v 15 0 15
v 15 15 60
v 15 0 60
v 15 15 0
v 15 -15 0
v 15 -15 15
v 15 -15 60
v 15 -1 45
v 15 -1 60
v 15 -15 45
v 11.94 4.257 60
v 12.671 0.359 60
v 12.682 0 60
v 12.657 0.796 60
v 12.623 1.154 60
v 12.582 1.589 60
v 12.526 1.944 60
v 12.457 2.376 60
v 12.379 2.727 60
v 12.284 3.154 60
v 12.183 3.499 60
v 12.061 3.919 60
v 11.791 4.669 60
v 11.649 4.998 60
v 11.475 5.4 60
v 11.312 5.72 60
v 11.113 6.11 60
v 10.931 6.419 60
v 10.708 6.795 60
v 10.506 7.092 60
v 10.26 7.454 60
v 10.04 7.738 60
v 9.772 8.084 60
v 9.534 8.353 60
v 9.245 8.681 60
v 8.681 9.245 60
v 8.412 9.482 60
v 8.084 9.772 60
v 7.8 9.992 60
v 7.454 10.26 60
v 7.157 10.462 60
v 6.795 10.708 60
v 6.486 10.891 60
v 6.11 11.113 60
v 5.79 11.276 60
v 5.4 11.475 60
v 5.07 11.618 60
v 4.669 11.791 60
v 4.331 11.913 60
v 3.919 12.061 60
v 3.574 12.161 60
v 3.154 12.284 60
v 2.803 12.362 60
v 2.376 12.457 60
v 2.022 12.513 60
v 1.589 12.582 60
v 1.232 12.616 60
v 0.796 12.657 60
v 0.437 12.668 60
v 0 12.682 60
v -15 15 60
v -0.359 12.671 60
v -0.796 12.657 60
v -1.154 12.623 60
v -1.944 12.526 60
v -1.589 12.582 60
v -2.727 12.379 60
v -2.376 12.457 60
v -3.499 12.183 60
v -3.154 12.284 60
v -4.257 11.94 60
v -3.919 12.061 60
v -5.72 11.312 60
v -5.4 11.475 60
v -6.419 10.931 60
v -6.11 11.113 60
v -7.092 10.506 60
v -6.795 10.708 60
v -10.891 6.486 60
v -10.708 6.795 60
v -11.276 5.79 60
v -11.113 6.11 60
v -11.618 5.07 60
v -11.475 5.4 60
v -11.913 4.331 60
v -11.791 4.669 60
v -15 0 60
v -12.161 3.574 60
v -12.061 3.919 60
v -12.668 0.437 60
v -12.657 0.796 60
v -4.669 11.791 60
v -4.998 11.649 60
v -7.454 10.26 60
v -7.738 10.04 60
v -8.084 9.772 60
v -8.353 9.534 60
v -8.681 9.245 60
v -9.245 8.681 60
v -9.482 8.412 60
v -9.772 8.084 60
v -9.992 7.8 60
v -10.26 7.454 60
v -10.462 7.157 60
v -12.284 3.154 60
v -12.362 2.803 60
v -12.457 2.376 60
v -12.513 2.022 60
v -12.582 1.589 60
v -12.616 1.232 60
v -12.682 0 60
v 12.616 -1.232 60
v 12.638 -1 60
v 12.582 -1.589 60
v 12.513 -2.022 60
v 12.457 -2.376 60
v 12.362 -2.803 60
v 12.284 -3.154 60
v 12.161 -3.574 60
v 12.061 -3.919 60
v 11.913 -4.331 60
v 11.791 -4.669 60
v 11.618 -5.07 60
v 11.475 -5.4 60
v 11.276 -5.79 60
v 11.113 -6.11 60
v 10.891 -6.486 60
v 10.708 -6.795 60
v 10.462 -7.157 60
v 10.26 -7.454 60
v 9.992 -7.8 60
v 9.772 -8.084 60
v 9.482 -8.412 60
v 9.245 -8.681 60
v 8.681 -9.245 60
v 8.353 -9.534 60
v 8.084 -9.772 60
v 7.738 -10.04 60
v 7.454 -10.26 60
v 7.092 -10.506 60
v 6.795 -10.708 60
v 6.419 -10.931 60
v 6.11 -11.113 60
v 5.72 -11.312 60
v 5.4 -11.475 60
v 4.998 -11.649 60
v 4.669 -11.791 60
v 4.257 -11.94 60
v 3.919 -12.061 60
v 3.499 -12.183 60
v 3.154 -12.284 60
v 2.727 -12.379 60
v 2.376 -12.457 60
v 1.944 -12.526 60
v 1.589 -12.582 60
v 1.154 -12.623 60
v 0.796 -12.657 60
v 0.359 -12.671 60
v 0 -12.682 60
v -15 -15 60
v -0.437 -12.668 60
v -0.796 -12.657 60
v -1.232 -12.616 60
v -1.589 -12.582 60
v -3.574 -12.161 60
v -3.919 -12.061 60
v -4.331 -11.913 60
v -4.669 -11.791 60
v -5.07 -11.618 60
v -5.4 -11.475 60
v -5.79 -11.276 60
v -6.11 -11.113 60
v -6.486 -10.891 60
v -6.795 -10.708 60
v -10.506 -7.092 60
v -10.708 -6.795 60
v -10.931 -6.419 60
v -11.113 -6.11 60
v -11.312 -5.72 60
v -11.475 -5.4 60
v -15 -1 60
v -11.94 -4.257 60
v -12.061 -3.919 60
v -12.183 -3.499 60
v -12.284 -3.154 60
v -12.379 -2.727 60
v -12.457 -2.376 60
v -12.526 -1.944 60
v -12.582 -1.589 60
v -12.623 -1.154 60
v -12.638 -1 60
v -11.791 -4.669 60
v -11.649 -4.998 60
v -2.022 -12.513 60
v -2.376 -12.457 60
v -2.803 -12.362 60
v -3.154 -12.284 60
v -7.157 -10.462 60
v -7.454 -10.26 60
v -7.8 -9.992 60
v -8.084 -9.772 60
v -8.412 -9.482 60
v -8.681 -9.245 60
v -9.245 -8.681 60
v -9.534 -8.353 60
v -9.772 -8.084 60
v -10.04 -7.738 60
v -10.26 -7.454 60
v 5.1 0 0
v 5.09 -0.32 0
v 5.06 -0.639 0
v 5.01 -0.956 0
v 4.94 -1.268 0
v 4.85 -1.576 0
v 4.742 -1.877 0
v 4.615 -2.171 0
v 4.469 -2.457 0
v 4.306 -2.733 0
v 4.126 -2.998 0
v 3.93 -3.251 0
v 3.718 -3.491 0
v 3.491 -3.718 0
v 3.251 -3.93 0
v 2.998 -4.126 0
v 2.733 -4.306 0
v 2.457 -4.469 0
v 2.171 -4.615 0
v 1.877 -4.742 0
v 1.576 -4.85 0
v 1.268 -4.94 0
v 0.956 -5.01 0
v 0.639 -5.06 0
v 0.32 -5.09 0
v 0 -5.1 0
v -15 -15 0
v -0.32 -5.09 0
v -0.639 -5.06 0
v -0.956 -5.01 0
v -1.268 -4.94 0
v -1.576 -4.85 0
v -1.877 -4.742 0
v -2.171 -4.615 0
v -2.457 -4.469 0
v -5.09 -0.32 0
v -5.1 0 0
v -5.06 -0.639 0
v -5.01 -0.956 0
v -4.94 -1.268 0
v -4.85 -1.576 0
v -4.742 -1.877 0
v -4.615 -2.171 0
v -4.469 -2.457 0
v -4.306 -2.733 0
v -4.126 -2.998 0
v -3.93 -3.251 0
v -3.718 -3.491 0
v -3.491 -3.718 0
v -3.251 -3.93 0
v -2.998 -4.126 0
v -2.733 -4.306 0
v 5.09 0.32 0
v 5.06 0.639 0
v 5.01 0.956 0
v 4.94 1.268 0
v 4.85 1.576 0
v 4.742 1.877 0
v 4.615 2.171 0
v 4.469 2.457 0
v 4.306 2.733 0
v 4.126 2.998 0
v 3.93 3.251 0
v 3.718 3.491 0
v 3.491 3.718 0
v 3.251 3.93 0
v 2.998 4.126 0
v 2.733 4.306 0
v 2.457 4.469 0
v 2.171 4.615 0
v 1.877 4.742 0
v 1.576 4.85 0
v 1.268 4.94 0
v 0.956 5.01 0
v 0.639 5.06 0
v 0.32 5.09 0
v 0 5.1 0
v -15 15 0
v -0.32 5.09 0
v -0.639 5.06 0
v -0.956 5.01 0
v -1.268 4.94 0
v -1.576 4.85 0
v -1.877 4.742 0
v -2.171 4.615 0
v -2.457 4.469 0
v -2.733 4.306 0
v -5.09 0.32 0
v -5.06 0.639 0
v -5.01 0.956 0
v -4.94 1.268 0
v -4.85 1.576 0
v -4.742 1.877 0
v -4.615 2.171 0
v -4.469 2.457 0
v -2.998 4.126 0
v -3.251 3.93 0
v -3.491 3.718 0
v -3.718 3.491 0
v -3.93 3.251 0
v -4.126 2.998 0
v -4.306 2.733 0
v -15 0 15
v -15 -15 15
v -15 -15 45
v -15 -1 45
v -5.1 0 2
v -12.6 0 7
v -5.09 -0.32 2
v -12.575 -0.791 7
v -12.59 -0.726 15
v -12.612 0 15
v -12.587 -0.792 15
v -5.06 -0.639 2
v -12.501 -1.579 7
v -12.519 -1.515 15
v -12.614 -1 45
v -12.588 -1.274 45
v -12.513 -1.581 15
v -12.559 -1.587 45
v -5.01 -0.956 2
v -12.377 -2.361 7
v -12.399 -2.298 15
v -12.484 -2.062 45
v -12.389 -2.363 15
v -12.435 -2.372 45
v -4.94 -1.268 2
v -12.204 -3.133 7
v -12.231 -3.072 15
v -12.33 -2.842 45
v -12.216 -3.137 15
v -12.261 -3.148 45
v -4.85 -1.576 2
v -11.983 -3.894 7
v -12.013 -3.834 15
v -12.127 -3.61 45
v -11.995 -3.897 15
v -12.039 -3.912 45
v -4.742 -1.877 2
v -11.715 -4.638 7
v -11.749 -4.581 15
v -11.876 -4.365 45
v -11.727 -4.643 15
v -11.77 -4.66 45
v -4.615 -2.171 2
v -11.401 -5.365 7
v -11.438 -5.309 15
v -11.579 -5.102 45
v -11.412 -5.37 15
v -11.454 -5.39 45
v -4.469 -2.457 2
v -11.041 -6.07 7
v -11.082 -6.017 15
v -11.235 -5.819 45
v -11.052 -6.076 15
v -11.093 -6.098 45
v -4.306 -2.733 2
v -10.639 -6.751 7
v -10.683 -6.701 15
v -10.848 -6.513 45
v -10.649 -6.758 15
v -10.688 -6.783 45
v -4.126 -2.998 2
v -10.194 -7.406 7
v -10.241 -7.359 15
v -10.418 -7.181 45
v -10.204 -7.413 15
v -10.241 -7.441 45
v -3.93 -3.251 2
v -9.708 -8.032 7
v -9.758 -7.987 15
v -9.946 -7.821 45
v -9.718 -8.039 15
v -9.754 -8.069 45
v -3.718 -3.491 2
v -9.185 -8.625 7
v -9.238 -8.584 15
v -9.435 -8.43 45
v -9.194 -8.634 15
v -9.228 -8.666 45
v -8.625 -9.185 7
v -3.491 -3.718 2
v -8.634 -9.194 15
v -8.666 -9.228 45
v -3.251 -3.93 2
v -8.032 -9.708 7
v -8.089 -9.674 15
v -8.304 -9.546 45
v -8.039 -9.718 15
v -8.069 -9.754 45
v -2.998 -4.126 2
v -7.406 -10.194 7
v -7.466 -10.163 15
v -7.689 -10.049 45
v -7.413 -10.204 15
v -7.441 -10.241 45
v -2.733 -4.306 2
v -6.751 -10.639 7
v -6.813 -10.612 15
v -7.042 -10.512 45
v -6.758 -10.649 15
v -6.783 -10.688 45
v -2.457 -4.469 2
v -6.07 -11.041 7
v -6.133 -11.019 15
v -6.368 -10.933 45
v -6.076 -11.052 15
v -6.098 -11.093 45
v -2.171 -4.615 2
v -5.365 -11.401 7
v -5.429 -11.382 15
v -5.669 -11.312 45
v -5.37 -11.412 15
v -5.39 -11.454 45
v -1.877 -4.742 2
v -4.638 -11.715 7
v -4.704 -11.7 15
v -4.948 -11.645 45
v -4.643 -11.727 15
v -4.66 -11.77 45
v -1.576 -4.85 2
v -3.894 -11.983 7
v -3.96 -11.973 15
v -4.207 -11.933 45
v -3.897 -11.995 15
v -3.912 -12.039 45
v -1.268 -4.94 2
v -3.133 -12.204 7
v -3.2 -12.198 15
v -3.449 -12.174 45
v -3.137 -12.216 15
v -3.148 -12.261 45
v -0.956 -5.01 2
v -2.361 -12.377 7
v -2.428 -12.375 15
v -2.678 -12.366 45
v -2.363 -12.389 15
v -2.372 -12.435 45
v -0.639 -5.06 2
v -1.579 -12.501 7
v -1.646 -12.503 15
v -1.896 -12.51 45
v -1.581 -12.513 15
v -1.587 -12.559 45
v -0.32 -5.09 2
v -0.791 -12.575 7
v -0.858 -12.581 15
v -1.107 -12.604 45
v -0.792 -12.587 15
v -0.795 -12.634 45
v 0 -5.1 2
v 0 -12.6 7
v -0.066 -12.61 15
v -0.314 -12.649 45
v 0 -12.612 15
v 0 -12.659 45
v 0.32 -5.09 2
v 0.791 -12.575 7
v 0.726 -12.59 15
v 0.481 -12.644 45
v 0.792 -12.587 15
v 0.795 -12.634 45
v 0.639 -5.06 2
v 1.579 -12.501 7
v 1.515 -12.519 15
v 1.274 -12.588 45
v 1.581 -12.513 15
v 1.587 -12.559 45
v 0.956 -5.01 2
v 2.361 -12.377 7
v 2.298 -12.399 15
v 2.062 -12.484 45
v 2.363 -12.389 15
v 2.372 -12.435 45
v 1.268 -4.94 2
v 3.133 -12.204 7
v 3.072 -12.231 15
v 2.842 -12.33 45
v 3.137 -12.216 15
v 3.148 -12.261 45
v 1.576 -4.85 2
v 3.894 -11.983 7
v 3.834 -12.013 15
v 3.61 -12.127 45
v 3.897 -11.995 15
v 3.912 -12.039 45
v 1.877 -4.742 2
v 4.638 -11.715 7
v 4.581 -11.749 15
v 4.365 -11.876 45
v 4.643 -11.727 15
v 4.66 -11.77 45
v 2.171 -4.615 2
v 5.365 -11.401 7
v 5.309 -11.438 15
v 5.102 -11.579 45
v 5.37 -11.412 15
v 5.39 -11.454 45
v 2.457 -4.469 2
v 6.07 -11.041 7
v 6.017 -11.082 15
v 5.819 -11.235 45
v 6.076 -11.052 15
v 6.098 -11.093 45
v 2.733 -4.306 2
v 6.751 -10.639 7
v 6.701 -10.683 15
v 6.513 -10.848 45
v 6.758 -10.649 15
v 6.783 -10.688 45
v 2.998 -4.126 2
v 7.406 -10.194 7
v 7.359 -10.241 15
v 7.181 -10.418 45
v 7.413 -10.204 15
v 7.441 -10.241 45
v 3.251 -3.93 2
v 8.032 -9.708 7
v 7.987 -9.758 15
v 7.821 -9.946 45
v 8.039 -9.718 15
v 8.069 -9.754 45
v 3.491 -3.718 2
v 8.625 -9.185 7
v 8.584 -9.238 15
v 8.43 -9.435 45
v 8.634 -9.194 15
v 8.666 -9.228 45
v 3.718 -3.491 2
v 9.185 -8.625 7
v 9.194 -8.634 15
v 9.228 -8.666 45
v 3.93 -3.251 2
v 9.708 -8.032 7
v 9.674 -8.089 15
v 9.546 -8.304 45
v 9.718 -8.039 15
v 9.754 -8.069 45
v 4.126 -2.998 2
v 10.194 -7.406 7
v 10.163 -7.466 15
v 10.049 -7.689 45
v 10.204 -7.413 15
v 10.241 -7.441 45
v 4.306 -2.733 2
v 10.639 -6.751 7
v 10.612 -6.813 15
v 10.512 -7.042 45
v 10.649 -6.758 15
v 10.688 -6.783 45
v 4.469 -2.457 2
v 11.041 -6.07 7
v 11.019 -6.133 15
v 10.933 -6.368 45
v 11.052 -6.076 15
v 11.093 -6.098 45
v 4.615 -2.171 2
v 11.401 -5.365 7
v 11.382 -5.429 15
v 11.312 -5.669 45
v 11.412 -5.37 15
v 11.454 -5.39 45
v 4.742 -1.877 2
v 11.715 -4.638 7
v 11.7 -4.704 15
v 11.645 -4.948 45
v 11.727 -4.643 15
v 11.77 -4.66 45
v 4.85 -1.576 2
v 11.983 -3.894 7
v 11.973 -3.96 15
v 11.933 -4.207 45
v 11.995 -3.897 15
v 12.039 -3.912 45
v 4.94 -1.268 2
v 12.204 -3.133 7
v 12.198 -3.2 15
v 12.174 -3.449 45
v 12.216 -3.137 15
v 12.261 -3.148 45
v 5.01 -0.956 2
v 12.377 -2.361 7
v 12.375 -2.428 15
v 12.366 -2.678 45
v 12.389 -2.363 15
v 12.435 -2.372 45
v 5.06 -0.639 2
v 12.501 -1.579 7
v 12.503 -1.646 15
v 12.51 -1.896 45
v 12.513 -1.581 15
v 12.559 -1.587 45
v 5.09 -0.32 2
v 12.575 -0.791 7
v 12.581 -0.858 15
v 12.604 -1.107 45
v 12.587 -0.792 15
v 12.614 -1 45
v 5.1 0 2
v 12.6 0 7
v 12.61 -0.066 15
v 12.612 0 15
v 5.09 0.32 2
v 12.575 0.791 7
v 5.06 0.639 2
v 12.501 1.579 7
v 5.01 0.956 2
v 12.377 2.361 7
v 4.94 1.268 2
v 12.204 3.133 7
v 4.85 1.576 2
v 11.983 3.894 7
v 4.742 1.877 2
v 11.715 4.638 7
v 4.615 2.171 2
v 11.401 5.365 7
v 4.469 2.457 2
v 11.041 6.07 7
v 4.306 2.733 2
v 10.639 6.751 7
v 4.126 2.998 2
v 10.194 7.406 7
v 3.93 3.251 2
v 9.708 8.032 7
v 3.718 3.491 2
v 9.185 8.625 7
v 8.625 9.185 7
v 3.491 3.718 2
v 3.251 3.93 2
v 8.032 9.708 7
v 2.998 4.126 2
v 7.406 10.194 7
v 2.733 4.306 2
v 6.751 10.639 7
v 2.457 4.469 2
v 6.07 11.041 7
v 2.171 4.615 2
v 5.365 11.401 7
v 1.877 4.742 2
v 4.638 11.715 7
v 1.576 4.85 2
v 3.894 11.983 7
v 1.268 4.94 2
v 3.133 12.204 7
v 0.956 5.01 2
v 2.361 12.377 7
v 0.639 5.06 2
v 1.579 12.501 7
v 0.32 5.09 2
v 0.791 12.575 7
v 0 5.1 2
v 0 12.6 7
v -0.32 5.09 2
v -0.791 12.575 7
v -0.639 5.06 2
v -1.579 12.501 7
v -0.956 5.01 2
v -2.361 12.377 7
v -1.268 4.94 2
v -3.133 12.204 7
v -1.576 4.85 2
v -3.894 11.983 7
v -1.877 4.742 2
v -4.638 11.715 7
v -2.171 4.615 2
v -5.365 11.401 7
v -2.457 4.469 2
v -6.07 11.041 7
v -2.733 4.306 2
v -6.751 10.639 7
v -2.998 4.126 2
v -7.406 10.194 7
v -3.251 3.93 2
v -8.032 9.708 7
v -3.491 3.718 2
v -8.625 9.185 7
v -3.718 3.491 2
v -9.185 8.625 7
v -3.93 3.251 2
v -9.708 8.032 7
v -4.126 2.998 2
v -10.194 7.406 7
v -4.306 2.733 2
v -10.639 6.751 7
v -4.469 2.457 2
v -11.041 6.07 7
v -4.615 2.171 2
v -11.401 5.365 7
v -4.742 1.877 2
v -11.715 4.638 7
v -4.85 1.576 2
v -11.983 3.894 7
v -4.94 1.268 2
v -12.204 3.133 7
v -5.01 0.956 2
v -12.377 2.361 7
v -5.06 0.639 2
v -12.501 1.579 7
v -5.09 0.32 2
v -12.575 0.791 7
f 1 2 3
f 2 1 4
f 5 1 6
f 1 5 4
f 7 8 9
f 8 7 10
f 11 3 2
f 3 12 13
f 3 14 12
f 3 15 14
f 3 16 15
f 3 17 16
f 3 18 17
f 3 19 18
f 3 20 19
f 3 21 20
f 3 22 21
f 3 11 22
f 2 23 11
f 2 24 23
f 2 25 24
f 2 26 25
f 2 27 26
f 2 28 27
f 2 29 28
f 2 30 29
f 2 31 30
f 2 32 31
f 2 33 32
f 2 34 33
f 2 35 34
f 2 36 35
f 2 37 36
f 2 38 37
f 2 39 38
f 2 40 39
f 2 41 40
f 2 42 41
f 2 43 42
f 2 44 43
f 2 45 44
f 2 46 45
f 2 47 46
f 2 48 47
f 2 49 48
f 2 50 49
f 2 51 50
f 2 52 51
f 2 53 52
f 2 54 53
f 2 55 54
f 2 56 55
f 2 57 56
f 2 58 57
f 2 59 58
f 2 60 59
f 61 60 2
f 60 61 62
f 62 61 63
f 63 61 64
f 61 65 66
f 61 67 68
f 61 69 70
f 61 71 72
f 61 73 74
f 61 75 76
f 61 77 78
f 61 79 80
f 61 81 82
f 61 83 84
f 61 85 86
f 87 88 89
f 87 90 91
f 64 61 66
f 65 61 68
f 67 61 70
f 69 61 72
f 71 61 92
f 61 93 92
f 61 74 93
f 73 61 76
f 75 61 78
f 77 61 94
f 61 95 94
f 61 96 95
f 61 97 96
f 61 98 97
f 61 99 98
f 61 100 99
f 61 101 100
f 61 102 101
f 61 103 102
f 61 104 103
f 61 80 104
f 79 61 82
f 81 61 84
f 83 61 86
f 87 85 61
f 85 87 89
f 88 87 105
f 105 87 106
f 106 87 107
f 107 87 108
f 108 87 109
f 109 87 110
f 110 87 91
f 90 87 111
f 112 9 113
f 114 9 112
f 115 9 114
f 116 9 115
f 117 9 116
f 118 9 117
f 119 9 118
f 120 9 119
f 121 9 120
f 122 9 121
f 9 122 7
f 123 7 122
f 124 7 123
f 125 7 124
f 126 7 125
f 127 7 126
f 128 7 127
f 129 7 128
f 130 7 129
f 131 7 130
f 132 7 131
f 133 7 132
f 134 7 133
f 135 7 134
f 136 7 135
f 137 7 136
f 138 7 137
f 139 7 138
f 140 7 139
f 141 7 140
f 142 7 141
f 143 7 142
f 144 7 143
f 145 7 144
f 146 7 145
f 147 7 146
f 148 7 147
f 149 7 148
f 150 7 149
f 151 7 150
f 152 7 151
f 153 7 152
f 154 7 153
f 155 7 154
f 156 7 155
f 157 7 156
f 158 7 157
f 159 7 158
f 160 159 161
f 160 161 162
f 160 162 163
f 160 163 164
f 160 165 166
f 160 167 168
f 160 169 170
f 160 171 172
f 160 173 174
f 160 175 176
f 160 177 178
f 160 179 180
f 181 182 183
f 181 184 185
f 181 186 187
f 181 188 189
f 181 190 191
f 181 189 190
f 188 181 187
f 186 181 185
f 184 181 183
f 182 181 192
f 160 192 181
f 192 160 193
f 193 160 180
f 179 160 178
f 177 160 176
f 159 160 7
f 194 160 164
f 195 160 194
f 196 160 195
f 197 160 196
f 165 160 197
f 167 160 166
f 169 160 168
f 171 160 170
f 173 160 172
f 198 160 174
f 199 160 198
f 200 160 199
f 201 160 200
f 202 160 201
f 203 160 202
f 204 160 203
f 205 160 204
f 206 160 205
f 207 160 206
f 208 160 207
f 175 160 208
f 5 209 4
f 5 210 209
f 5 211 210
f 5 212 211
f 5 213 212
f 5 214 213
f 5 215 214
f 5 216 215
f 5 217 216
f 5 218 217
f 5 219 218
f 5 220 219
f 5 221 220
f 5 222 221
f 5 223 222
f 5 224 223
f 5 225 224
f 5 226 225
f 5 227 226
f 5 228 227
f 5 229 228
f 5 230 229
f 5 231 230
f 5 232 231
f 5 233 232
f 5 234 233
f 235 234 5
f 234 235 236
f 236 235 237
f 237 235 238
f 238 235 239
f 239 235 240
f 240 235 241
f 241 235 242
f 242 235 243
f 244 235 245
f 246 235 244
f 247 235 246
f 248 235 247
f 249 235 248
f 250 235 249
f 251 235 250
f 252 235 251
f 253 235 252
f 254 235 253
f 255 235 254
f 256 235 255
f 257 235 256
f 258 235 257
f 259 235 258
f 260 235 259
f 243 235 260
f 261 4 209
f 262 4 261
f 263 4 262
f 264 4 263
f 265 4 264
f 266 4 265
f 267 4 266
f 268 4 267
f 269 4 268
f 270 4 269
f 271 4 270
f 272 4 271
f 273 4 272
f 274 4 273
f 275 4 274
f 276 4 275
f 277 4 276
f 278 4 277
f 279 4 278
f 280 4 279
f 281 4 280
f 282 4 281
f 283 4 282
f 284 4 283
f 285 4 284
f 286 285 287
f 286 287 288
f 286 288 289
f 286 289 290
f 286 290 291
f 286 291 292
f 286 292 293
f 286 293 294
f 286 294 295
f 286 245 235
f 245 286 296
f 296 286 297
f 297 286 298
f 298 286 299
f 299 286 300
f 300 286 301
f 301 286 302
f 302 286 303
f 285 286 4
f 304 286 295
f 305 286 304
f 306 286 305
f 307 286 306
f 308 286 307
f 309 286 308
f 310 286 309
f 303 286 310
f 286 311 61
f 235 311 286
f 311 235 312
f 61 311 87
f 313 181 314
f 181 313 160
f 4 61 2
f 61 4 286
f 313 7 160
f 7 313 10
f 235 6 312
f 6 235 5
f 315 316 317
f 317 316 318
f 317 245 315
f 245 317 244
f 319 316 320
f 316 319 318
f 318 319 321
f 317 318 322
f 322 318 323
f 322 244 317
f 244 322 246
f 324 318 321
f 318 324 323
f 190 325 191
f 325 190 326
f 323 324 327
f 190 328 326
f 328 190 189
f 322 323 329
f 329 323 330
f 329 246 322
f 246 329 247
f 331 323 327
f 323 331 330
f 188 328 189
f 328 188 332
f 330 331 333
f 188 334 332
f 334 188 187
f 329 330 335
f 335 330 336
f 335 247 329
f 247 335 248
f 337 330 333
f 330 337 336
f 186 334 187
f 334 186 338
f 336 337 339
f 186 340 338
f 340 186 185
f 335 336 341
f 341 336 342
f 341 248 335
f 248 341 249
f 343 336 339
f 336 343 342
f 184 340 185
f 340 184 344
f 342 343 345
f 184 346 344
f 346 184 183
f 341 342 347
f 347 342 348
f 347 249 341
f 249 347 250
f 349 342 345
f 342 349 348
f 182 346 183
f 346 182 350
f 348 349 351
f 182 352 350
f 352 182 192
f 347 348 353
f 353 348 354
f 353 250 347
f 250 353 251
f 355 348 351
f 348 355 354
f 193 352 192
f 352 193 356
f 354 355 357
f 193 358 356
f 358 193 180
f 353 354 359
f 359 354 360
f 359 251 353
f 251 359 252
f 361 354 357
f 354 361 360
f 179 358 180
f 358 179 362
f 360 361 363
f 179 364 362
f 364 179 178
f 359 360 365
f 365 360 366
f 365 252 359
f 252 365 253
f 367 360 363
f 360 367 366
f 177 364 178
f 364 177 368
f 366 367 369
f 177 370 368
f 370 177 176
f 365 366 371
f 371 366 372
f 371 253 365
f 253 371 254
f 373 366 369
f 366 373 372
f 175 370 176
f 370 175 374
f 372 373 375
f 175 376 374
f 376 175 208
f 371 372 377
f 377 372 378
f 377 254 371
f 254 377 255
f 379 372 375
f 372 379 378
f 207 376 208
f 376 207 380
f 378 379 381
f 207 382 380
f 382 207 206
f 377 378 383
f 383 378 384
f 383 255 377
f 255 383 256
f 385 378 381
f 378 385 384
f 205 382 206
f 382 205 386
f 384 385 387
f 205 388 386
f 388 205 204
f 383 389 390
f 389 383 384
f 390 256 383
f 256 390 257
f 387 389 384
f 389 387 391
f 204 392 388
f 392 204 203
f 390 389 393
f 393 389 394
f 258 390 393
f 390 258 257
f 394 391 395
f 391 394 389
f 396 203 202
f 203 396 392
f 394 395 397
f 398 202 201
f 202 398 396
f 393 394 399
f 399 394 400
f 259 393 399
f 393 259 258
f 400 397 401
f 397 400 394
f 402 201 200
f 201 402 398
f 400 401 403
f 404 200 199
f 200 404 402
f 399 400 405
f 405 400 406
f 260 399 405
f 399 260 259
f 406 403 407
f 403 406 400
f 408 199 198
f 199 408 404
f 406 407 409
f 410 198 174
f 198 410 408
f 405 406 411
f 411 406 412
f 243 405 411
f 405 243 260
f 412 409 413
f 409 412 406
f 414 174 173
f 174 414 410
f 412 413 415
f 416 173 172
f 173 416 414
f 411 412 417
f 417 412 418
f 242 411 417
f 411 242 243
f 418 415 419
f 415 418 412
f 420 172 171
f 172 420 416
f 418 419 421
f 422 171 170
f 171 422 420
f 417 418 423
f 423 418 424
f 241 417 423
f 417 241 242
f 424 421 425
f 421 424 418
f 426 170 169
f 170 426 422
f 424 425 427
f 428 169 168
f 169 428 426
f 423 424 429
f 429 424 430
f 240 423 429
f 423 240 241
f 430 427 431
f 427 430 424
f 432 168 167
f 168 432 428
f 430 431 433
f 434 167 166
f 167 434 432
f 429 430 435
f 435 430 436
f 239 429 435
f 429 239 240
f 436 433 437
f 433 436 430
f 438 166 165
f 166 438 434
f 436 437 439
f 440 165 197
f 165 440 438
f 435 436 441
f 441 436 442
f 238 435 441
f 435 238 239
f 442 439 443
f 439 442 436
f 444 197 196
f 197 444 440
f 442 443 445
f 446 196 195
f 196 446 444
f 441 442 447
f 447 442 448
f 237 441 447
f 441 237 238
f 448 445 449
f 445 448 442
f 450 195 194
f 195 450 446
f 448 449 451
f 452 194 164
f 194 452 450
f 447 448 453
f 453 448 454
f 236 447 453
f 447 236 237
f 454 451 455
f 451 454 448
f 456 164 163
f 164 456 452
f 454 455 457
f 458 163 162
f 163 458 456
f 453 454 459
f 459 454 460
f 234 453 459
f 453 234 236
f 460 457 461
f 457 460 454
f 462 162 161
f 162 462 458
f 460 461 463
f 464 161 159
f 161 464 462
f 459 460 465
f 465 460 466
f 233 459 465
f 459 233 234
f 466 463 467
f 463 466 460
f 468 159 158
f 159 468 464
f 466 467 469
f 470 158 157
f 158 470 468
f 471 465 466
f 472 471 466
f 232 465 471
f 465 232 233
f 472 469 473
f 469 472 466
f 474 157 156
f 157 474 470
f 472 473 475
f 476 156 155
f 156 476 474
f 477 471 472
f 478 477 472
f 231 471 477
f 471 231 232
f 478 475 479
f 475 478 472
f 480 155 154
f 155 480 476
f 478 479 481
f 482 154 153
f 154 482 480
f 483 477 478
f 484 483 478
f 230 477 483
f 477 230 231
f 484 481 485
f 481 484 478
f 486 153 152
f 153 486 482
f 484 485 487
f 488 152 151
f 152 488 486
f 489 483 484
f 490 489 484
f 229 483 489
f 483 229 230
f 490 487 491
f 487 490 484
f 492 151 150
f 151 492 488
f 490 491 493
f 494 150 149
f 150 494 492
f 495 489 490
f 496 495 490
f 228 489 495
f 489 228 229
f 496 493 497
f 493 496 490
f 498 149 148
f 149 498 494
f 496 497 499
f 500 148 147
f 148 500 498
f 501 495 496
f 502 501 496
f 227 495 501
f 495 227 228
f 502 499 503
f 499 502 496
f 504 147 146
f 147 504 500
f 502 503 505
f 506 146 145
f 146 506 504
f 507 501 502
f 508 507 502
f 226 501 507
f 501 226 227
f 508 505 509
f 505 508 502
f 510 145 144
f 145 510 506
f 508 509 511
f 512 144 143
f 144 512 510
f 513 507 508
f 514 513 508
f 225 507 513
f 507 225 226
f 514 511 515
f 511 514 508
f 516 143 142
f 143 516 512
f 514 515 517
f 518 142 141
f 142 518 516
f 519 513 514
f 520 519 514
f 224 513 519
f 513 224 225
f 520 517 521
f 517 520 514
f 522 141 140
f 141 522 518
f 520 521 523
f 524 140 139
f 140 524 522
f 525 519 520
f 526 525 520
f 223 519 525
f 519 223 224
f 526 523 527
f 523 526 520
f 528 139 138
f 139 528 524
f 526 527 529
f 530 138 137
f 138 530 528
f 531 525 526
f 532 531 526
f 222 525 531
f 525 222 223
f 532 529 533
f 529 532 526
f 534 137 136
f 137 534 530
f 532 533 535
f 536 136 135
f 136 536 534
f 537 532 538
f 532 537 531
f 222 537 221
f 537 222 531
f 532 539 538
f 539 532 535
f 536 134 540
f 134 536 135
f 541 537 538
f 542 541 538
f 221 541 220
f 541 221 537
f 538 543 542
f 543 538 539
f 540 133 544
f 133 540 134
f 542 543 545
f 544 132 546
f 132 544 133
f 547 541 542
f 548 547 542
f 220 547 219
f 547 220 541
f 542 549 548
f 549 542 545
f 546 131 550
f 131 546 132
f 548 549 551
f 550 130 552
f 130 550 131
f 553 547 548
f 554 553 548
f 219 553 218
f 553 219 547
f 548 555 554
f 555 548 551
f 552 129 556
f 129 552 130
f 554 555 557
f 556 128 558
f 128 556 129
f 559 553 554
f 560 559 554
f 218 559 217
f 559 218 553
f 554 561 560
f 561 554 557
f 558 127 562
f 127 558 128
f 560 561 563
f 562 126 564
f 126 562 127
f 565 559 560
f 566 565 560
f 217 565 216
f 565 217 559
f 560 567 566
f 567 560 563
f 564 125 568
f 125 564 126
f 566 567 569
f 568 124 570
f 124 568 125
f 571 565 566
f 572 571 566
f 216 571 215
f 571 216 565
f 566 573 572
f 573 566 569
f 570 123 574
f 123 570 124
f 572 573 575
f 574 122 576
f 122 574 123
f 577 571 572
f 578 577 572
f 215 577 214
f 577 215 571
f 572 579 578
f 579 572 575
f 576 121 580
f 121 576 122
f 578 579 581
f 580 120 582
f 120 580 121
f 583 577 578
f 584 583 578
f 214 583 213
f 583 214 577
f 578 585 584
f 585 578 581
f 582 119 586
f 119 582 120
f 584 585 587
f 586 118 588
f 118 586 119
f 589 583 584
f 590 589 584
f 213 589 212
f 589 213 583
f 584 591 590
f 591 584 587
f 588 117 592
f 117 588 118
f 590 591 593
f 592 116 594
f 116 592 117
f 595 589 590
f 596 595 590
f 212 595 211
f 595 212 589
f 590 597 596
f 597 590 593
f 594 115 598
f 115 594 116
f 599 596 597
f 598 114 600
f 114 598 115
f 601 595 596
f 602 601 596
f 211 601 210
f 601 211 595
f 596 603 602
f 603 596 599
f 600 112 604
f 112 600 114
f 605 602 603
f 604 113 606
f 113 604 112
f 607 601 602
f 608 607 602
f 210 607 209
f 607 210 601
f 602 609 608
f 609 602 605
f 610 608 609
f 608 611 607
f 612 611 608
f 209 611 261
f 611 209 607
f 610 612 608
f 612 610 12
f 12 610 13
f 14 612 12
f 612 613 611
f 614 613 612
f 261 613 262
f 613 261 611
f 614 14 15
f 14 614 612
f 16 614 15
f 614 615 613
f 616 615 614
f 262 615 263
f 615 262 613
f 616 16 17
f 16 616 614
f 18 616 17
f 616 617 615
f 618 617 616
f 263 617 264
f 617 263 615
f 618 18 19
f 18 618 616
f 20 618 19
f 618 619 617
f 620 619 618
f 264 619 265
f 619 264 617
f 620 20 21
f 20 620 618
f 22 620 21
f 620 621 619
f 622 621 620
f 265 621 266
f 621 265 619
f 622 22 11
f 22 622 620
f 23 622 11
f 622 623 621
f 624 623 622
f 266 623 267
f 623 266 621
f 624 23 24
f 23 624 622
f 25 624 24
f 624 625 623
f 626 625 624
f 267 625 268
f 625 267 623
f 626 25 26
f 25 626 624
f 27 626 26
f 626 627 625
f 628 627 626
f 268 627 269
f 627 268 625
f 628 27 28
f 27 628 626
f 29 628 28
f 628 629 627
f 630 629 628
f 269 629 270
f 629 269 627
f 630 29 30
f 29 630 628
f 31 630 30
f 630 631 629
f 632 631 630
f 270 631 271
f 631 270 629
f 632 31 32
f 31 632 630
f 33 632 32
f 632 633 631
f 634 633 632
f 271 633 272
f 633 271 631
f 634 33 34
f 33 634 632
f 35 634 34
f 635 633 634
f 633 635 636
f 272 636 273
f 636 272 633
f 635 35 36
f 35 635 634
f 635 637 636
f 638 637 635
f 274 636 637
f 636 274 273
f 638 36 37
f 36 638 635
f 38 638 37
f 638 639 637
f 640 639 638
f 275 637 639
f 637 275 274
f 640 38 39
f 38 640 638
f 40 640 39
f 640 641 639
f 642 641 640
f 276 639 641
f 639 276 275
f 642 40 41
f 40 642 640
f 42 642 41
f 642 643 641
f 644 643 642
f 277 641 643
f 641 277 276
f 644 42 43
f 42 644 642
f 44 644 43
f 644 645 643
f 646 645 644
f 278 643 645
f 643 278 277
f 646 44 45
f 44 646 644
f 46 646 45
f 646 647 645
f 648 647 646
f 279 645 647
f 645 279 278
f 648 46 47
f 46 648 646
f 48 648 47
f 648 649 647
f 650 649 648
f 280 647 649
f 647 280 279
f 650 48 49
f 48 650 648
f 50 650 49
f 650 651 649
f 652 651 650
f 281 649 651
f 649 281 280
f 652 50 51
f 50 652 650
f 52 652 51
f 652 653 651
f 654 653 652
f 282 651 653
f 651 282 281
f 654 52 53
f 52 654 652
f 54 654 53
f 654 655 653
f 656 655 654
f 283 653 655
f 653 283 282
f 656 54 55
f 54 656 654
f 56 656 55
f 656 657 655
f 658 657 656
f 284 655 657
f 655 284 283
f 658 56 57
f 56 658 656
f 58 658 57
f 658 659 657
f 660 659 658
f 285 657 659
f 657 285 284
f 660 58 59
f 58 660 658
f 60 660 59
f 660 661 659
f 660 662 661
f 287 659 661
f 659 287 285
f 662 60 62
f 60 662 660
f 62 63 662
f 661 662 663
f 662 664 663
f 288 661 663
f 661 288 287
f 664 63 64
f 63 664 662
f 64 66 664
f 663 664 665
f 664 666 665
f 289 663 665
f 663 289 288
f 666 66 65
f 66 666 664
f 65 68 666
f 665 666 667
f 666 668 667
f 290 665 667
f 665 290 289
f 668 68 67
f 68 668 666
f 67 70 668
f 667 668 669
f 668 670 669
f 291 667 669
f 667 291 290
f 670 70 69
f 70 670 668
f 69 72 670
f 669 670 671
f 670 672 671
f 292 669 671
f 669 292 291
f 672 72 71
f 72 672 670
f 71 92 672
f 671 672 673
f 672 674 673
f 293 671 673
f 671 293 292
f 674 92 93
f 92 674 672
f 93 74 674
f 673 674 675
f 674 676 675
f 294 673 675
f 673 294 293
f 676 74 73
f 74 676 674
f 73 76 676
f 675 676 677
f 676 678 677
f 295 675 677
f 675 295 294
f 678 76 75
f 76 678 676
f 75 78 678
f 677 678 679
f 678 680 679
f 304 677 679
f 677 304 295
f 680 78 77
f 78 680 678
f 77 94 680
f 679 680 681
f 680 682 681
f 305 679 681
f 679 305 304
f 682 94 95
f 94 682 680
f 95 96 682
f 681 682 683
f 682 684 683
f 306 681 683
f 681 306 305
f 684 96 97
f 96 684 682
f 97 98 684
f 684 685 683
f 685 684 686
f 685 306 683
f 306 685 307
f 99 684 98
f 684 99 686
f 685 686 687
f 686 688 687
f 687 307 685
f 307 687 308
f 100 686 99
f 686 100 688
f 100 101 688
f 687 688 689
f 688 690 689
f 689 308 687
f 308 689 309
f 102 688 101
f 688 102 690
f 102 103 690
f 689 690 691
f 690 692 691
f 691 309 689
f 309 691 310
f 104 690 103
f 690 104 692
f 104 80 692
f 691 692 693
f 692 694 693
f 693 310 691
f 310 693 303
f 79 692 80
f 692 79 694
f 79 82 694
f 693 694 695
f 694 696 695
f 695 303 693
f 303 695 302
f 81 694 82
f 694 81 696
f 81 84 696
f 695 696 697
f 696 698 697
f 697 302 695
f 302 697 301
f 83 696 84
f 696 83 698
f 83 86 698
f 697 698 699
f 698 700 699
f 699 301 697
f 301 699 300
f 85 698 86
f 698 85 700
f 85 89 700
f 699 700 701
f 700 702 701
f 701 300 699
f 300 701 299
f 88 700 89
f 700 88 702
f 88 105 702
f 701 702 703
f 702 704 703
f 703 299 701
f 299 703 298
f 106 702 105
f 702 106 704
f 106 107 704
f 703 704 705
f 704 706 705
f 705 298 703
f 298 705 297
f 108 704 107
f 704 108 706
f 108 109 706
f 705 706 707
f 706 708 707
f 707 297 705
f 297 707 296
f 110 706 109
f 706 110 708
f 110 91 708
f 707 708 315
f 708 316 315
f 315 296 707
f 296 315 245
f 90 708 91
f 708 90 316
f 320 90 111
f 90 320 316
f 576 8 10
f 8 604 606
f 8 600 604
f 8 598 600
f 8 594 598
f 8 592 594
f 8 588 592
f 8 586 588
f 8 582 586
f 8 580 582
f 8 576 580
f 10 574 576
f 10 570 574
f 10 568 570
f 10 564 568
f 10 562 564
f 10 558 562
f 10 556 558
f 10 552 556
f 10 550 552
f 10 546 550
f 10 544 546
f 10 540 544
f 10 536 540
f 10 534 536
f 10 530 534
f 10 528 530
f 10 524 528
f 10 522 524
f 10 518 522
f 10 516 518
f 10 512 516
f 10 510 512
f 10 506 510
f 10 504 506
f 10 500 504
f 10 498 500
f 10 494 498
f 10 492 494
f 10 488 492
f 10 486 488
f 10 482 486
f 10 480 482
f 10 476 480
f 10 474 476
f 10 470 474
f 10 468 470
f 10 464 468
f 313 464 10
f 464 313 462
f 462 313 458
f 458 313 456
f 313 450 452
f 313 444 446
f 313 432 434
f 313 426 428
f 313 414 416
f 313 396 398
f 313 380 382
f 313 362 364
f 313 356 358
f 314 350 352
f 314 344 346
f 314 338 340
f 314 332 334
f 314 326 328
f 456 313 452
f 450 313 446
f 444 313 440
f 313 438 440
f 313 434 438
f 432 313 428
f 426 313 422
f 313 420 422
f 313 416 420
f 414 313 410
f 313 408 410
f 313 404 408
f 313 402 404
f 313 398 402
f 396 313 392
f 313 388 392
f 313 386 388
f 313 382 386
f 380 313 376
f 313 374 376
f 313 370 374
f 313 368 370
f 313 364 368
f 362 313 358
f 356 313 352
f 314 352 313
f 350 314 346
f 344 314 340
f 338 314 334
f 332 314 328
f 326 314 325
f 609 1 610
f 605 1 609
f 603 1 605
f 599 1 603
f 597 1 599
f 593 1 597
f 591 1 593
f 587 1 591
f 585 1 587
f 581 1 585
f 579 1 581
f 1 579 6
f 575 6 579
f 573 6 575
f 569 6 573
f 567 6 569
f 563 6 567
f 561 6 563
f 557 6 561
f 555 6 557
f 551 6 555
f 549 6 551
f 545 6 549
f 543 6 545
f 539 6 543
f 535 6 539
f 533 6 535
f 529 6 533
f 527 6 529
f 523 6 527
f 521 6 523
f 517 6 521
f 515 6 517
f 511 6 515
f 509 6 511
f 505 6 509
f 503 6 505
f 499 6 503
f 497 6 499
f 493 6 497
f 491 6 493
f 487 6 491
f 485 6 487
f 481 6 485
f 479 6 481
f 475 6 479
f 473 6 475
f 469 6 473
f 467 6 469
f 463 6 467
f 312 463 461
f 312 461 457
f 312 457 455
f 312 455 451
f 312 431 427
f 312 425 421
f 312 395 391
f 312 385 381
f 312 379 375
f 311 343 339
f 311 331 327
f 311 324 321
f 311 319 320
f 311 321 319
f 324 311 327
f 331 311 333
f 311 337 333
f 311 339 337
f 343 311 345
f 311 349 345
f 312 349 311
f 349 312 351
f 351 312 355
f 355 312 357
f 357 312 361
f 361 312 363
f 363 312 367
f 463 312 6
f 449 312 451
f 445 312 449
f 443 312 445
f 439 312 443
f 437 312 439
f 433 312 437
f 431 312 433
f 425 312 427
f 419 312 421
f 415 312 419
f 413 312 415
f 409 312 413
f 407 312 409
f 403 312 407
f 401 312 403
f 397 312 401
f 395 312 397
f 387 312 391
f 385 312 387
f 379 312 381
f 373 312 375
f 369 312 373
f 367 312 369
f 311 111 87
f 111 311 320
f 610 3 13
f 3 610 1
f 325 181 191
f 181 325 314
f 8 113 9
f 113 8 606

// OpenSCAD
// file: roundedcube.scad
// Higher definition curves
$fs = 0.01;

module roundedcube(size = [1, 1, 1], center = false, radius = 0.5, apply_to = "all") {
	// If single value, convert to [x, y, z] vector
	size = (size[0] == undef) ? [size, size, size] : size;

	translate_min = radius;
	translate_xmax = size[0] - radius;
	translate_ymax = size[1] - radius;
	translate_zmax = size[2] - radius;

	diameter = radius * 2;

	module build_point(type = "sphere", rotate = [0, 0, 0]) {
		if (type == "sphere") {
			sphere(r = radius);
		} else if (type == "cylinder") {
			rotate(a = rotate)
			cylinder(h = diameter, r = radius, center = true);
		}
	}

	obj_translate = (center == false) ?
		[0, 0, 0] : [
			-(size[0] / 2),
			-(size[1] / 2),
			-(size[2] / 2)
		];

	translate(v = obj_translate) {
		hull() {
			for (translate_x = [translate_min, translate_xmax]) {
				x_at = (translate_x == translate_min) ? "min" : "max";
				for (translate_y = [translate_min, translate_ymax]) {
					y_at = (translate_y == translate_min) ? "min" : "max";
					for (translate_z = [translate_min, translate_zmax]) {
						z_at = (translate_z == translate_min) ? "min" : "max";

						translate(v = [translate_x, translate_y, translate_z])
						if (
							(apply_to == "all") ||
							(apply_to == "xmin" && x_at == "min") || (apply_to == "xmax" && x_at == "max") ||
							(apply_to == "ymin" && y_at == "min") || (apply_to == "ymax" && y_at == "max") ||
							(apply_to == "zmin" && z_at == "min") || (apply_to == "zmax" && z_at == "max")
						) {
							build_point("sphere");
						} else {
							rotate =
								(apply_to == "xmin" || apply_to == "xmax" || apply_to == "x") ? [0, 90, 0] : (
								(apply_to == "ymin" || apply_to == "ymax" || apply_to == "y") ? [90, 90, 0] :
								[0, 0, 0]
							);
							build_point("cylinder", rotate);
						}
					}
				}
			}
		}
	}
}

module roundedcubez(size = [1, 1, 1], center = false, radius = 0.5, apply_to = "all") {
	intersection() {
		roundedcube(size, center, radius, apply_to="z");
		scale([1.0, 1.0, 1.1])
			cube(size, center);
	}
}

// The good stuff!!!!  Forget about the whack stuff above.
// centered on XY only
module cube_(size=[1, 1, 1])
	translate([-size[0] / 2, -size[1] / 2, 0])
		cube(size);

// centered on XY only
module roundedcubez_(size = [1, 1, 1], radius = 0.5) {
	linear_extrude(height=size[2]) {
		square([size[0] - 2 * radius, size[1]], center=true);
		square([size[0], size[1] - 2 * radius], center=true);
		for (i=[-1, 1])
			for (j=[-1, 1])
				translate([i * (size[0] / 2 - radius), j * (size[1] / 2 - radius), 0])
					circle(r = radius);
	}
}
// main file
$fn = $preview ? 30 : 100;

include <roundedcube.scad>


// Fits on our big creality 3D printer head
module mounting_plate() {
	holes = [[0, 0], [-14, 0], [1, 25], [1 - 44, 25]];
	spacer_height = 3.5;

	difference() {
		union() {
			translate([-52, -7, 0.1])
				roundedcubez([60, 40, 4], radius=10);
			// spacers
			for (p = holes)
				translate([p[0], p[1], -spacer_height])
					cylinder(h=spacer_height, d=13, center=false);
		}

		// Trough holes
		for (p = holes)
			translate([p[0], p[1], 0])
				cylinder(h=20, d=spacer_height, center=true);

		// Holes for metal standoffs
		for (p = [holes[0], holes[1]]) {
			translate([p[0], p[1], -spacer_height - 0.01])
				cylinder(h=5, d=5.5, center=false);

		// Clearance stuff
		translate([-27.5, -5, -2.5])
			rotate([0, 0, 20])
				cube(size=[20, 20, 5], center=true);
		translate([-60 - 18, -17 + 5, -10])
			cube(size=[60, 10, 20]);
		}
	}
}

module syringe() {
	translate([0, 0, 97 + 5 + 2])
		rotate([180, 0, 0])
			rotate_extrude()
				polygon([
					[0, 0],
					[25.5 / 2, 0],
					[25.2 / 2, 97],
					[10.2 / 2, 97 + 5],
					[10.2 / 2, 97 + 5 + 7.5],
					[0, 97 + 5 + 7.5],
				]);
}

// mounting_plate();

difference() {
	cube_(size=[30, 30, 60]);
	syringe();
	translate([0, -15, 15])
		cube_(size=[31, 30, 30]);
	translate([0, -0.5, 32])
		cube_(size=[31, 1, 30]);
}

// syringe();
